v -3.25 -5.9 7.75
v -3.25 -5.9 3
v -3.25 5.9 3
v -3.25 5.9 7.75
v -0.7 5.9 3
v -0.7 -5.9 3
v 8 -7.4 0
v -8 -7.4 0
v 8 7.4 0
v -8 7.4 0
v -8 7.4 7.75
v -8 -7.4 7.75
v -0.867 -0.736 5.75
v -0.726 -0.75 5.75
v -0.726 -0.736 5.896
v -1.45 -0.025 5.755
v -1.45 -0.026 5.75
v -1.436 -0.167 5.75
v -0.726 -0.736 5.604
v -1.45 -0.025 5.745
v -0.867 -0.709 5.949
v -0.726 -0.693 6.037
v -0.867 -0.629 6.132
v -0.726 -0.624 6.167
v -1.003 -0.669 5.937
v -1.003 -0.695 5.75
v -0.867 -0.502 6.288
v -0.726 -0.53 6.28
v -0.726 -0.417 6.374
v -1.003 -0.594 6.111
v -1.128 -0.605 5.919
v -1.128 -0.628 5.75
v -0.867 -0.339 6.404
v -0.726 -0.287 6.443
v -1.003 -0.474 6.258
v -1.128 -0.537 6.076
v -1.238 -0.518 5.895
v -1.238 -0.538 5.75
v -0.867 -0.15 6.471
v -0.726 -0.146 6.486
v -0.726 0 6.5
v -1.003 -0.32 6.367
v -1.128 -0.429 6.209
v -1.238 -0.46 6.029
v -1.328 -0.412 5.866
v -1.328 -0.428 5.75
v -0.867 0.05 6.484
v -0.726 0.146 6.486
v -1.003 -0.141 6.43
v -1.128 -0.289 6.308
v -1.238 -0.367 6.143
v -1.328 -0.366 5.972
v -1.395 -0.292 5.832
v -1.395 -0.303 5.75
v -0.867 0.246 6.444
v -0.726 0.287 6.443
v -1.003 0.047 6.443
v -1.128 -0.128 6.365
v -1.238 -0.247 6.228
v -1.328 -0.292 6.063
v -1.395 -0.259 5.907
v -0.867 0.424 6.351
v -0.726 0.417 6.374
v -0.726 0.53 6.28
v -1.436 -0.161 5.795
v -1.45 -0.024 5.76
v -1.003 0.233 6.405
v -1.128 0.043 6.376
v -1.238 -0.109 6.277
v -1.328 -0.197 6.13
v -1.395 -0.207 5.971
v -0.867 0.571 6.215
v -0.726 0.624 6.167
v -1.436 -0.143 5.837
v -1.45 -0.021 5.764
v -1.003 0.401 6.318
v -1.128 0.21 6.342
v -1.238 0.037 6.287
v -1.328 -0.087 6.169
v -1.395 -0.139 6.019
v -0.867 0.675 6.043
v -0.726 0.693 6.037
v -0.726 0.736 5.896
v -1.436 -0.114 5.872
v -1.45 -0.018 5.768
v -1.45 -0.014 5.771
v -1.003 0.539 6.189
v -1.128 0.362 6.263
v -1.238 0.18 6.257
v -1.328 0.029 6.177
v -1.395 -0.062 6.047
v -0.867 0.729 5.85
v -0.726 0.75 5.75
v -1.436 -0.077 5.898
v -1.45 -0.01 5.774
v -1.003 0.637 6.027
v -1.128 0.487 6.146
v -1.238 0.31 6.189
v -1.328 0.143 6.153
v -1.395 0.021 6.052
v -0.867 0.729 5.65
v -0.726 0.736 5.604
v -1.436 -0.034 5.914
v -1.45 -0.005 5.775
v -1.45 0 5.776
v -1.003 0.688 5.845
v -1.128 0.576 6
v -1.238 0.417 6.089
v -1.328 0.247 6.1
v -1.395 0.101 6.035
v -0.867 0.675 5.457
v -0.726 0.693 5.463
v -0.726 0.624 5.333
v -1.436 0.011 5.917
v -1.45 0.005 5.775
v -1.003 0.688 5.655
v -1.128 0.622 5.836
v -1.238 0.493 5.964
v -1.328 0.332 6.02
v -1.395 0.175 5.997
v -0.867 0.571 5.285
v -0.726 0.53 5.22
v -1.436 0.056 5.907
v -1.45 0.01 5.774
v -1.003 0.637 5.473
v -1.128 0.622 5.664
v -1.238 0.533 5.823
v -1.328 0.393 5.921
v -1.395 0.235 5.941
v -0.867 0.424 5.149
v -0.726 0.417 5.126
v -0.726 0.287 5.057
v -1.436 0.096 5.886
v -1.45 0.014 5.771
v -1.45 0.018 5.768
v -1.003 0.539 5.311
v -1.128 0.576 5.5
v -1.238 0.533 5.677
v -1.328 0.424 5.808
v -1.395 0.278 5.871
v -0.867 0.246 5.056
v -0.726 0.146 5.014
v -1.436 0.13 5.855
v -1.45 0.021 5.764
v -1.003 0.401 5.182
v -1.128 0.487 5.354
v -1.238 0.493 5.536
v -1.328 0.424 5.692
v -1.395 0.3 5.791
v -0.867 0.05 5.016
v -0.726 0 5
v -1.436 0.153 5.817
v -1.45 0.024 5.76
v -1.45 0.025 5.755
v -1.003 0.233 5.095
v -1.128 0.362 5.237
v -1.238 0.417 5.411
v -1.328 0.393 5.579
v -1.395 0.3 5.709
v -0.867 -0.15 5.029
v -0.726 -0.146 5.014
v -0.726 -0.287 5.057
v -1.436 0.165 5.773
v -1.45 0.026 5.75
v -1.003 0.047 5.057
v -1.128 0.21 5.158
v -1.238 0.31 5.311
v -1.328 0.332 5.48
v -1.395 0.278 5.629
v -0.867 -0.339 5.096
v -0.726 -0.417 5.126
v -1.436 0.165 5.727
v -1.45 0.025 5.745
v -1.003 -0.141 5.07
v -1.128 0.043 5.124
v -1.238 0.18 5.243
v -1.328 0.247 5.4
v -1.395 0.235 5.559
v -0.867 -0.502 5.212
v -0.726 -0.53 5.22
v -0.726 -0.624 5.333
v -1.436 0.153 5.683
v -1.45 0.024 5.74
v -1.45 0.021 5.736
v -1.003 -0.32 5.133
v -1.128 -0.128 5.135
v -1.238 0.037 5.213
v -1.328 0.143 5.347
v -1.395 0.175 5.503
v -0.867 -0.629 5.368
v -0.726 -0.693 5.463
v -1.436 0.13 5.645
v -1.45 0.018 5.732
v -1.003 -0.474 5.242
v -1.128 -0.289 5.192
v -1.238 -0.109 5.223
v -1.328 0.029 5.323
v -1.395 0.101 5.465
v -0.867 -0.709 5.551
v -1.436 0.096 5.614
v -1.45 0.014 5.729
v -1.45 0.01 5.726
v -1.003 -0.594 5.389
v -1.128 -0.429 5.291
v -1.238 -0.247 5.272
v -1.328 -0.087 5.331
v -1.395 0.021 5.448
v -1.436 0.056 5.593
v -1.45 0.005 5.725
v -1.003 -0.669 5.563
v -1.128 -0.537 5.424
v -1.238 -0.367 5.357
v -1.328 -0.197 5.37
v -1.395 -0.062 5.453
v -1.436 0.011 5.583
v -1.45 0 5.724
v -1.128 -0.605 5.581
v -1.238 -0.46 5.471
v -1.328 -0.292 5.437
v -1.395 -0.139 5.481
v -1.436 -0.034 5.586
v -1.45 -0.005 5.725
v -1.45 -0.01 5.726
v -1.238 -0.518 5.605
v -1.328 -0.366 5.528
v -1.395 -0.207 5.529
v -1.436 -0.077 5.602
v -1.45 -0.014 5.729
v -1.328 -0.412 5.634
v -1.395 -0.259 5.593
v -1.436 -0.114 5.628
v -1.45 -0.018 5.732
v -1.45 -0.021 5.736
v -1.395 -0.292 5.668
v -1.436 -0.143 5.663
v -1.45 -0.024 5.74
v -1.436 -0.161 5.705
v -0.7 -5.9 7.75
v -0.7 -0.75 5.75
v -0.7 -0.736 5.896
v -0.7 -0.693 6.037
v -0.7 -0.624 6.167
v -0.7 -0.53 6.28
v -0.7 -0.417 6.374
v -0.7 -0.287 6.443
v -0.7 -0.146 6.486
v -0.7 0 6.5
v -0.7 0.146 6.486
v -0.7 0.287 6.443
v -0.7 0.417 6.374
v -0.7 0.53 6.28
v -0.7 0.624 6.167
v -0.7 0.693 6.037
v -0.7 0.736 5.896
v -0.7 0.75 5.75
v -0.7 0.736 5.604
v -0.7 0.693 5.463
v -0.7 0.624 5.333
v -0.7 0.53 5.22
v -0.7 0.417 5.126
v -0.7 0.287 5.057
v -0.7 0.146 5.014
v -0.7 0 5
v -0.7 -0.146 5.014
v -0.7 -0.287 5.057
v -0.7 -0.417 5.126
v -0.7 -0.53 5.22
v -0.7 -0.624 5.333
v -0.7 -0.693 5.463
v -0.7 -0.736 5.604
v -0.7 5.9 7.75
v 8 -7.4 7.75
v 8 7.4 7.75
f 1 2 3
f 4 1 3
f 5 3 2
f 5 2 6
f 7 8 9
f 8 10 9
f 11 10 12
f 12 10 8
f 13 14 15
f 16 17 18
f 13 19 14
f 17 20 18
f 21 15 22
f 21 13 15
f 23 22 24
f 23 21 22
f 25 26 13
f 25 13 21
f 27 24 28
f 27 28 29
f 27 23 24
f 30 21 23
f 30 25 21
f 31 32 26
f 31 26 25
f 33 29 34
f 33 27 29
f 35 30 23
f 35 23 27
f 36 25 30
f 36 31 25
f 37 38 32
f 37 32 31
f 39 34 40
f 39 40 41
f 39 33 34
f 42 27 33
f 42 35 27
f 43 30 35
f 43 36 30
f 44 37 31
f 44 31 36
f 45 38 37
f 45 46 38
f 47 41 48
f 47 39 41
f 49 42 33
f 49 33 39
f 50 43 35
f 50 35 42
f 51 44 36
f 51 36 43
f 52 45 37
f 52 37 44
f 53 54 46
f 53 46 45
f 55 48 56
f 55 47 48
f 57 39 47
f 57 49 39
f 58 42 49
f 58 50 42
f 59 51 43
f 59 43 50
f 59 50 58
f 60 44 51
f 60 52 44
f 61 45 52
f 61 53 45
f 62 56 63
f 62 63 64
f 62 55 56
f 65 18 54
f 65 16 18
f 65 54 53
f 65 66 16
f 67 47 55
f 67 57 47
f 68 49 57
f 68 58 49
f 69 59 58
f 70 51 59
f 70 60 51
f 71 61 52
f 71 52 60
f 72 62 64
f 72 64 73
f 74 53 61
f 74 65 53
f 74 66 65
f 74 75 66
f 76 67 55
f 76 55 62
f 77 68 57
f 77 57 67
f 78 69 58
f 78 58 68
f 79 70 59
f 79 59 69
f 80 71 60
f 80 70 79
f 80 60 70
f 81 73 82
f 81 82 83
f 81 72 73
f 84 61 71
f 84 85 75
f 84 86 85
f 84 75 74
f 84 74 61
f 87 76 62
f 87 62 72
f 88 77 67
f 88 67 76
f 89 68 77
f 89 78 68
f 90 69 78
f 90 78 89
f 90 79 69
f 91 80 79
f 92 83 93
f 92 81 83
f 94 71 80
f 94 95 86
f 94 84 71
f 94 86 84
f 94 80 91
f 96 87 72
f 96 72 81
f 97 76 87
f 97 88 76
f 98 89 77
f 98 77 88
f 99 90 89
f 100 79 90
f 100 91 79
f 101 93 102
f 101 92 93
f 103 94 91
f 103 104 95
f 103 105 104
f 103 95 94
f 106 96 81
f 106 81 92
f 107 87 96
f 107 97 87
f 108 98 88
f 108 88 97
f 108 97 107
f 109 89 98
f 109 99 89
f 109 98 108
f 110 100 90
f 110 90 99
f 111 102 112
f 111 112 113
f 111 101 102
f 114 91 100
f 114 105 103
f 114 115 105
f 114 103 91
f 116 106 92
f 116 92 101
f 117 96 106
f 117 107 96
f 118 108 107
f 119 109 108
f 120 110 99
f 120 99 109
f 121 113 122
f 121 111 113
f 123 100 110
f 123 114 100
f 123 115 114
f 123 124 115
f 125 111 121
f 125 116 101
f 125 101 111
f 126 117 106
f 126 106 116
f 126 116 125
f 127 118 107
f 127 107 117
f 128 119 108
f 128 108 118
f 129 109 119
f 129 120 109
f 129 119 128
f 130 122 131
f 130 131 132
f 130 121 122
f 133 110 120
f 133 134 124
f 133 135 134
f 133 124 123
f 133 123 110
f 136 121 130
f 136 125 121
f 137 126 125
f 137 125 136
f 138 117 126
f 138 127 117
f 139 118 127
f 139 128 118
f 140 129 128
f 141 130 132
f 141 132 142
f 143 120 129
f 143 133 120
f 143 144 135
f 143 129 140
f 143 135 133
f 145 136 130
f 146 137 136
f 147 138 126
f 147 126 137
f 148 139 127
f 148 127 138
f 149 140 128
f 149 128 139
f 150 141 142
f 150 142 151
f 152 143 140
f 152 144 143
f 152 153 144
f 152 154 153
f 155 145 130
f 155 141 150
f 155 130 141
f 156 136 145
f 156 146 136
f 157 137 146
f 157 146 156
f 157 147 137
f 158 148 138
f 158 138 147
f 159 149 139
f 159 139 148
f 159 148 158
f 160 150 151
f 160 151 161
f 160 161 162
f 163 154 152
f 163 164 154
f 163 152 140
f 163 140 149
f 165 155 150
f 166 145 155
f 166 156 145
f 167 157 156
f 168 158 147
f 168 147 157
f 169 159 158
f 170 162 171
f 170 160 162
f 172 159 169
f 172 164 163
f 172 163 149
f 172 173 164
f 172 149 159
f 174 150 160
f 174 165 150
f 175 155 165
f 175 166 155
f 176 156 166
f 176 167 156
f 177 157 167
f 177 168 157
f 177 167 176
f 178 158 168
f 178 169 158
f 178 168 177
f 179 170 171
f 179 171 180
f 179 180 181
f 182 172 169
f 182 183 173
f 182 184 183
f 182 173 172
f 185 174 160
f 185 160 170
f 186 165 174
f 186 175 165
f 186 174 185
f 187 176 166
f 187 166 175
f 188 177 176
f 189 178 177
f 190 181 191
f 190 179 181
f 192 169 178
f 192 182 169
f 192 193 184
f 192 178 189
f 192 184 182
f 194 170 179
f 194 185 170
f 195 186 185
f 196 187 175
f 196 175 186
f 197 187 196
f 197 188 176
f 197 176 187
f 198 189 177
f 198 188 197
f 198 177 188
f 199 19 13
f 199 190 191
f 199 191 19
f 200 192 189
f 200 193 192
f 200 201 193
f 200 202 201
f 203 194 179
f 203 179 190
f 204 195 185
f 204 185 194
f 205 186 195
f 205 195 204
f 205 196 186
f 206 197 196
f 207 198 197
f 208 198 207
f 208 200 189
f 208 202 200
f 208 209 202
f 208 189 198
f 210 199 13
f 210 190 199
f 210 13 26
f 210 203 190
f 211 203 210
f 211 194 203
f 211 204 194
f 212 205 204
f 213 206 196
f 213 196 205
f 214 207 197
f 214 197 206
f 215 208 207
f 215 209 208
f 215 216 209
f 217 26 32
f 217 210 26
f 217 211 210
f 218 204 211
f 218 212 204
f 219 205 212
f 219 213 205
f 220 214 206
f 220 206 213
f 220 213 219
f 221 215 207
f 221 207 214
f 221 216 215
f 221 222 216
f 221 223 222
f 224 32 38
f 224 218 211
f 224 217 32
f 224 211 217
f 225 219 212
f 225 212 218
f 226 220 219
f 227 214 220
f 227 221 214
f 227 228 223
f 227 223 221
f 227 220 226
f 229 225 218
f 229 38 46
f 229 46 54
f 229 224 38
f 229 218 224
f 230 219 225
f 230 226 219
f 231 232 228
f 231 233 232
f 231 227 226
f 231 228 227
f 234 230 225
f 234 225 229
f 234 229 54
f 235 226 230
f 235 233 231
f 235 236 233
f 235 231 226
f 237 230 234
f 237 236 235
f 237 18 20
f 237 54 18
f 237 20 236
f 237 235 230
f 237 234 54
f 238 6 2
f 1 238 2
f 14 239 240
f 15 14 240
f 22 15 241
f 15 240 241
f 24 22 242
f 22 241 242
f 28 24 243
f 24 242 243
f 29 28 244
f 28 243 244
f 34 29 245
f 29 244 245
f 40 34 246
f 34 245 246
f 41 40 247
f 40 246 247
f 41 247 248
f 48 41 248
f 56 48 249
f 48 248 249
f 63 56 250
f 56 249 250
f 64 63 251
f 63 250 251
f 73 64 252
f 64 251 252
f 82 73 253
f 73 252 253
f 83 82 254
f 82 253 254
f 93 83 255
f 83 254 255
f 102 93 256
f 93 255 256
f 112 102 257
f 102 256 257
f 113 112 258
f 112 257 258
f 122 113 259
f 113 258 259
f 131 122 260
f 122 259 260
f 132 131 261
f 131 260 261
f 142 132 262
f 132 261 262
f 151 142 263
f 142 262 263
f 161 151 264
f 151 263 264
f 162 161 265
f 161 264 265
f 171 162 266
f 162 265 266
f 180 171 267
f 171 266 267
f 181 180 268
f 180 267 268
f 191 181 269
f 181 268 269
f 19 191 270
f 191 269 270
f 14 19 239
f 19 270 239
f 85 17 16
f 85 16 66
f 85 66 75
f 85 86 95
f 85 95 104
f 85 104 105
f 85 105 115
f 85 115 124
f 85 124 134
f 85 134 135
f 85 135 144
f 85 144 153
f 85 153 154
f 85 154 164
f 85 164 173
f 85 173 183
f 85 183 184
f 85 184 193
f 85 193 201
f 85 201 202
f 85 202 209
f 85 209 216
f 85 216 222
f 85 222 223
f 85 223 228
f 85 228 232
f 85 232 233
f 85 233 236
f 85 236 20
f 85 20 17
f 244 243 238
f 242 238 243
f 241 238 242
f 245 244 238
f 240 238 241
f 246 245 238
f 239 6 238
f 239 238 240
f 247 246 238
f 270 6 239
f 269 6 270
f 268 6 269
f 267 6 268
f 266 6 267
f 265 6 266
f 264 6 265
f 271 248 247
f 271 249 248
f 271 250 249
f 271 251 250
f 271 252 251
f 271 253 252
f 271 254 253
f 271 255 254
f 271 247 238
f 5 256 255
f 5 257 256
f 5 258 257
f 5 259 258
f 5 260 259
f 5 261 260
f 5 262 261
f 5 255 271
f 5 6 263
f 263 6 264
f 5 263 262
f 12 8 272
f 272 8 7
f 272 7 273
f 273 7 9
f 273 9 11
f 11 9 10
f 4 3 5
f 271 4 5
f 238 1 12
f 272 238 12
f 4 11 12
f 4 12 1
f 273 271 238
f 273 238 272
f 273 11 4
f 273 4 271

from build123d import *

# Parameters (mm, degrees)
F3_W     = 8.7
F3_H     = 11.8
F3_W_2   = 2.55
F3_W_3   = 4.75
F4_DEPTH = 3
F5_DEPTH = 7.75
F6_R     = 0.75
F7_DEPTH = 0.75
F8_R     = 0.7242640687
F9_DEPTH = 7.75


# Not quite as in the source:
# - a feature names something its author has since deleted; it is built from what else it names


with BuildPart() as f4:
    # F3 (on Top) → F4 (new body)
    with BuildSketch(Plane.XY):
        with Locations((3.65, 0)):
            Rectangle(F3_W, F3_H)
        with Locations((-1.975, 0)):
            Rectangle(F3_W_2, F3_H)
        with Locations((-5.625, 0)):
            Rectangle(F3_W_3, F3_H)
    extrude(amount=F4_DEPTH)

    # F3 (on Top) → F5 (join)
    with BuildSketch(Plane.XY):
        with Locations((3.65, 0)):
            Rectangle(F3_W, F3_H)
        Polygon((8, -7.4), (8, -5.9), (-0.7, -5.9), (-3.25, -5.9), (-8, -5.9), (-8, -7.4), align=None)
        Polygon((-0.7, 5.9), (8, 5.9), (8, 7.4), (-8, 7.4), (-8, 5.9), (-3.25, 5.9), align=None)
    extrude(amount=F5_DEPTH)

    # F6 (on face) → F7 (join)
    with BuildSketch(Plane(origin=(-0.7, 0, 0), x_dir=(0, -1, 0), z_dir=(-1, 0, 0))):
        with Locations((0, 5.75)):
            Circle(F6_R)
    extrude(amount=F7_DEPTH)

    # F8
    f8_edges = [f4.edges().sort_by_distance(p)[0] for p in [
        (-1.45, 0.75, 5.75),
    ]]
    fillet(f8_edges, radius=F8_R)

    # F3 (on Top) → F9 (join)
    with BuildSketch(Plane.XY):
        with Locations((-5.625, 0)):
            Rectangle(F3_W_3, F3_H)
    extrude(amount=F9_DEPTH)


solid = f4.part
